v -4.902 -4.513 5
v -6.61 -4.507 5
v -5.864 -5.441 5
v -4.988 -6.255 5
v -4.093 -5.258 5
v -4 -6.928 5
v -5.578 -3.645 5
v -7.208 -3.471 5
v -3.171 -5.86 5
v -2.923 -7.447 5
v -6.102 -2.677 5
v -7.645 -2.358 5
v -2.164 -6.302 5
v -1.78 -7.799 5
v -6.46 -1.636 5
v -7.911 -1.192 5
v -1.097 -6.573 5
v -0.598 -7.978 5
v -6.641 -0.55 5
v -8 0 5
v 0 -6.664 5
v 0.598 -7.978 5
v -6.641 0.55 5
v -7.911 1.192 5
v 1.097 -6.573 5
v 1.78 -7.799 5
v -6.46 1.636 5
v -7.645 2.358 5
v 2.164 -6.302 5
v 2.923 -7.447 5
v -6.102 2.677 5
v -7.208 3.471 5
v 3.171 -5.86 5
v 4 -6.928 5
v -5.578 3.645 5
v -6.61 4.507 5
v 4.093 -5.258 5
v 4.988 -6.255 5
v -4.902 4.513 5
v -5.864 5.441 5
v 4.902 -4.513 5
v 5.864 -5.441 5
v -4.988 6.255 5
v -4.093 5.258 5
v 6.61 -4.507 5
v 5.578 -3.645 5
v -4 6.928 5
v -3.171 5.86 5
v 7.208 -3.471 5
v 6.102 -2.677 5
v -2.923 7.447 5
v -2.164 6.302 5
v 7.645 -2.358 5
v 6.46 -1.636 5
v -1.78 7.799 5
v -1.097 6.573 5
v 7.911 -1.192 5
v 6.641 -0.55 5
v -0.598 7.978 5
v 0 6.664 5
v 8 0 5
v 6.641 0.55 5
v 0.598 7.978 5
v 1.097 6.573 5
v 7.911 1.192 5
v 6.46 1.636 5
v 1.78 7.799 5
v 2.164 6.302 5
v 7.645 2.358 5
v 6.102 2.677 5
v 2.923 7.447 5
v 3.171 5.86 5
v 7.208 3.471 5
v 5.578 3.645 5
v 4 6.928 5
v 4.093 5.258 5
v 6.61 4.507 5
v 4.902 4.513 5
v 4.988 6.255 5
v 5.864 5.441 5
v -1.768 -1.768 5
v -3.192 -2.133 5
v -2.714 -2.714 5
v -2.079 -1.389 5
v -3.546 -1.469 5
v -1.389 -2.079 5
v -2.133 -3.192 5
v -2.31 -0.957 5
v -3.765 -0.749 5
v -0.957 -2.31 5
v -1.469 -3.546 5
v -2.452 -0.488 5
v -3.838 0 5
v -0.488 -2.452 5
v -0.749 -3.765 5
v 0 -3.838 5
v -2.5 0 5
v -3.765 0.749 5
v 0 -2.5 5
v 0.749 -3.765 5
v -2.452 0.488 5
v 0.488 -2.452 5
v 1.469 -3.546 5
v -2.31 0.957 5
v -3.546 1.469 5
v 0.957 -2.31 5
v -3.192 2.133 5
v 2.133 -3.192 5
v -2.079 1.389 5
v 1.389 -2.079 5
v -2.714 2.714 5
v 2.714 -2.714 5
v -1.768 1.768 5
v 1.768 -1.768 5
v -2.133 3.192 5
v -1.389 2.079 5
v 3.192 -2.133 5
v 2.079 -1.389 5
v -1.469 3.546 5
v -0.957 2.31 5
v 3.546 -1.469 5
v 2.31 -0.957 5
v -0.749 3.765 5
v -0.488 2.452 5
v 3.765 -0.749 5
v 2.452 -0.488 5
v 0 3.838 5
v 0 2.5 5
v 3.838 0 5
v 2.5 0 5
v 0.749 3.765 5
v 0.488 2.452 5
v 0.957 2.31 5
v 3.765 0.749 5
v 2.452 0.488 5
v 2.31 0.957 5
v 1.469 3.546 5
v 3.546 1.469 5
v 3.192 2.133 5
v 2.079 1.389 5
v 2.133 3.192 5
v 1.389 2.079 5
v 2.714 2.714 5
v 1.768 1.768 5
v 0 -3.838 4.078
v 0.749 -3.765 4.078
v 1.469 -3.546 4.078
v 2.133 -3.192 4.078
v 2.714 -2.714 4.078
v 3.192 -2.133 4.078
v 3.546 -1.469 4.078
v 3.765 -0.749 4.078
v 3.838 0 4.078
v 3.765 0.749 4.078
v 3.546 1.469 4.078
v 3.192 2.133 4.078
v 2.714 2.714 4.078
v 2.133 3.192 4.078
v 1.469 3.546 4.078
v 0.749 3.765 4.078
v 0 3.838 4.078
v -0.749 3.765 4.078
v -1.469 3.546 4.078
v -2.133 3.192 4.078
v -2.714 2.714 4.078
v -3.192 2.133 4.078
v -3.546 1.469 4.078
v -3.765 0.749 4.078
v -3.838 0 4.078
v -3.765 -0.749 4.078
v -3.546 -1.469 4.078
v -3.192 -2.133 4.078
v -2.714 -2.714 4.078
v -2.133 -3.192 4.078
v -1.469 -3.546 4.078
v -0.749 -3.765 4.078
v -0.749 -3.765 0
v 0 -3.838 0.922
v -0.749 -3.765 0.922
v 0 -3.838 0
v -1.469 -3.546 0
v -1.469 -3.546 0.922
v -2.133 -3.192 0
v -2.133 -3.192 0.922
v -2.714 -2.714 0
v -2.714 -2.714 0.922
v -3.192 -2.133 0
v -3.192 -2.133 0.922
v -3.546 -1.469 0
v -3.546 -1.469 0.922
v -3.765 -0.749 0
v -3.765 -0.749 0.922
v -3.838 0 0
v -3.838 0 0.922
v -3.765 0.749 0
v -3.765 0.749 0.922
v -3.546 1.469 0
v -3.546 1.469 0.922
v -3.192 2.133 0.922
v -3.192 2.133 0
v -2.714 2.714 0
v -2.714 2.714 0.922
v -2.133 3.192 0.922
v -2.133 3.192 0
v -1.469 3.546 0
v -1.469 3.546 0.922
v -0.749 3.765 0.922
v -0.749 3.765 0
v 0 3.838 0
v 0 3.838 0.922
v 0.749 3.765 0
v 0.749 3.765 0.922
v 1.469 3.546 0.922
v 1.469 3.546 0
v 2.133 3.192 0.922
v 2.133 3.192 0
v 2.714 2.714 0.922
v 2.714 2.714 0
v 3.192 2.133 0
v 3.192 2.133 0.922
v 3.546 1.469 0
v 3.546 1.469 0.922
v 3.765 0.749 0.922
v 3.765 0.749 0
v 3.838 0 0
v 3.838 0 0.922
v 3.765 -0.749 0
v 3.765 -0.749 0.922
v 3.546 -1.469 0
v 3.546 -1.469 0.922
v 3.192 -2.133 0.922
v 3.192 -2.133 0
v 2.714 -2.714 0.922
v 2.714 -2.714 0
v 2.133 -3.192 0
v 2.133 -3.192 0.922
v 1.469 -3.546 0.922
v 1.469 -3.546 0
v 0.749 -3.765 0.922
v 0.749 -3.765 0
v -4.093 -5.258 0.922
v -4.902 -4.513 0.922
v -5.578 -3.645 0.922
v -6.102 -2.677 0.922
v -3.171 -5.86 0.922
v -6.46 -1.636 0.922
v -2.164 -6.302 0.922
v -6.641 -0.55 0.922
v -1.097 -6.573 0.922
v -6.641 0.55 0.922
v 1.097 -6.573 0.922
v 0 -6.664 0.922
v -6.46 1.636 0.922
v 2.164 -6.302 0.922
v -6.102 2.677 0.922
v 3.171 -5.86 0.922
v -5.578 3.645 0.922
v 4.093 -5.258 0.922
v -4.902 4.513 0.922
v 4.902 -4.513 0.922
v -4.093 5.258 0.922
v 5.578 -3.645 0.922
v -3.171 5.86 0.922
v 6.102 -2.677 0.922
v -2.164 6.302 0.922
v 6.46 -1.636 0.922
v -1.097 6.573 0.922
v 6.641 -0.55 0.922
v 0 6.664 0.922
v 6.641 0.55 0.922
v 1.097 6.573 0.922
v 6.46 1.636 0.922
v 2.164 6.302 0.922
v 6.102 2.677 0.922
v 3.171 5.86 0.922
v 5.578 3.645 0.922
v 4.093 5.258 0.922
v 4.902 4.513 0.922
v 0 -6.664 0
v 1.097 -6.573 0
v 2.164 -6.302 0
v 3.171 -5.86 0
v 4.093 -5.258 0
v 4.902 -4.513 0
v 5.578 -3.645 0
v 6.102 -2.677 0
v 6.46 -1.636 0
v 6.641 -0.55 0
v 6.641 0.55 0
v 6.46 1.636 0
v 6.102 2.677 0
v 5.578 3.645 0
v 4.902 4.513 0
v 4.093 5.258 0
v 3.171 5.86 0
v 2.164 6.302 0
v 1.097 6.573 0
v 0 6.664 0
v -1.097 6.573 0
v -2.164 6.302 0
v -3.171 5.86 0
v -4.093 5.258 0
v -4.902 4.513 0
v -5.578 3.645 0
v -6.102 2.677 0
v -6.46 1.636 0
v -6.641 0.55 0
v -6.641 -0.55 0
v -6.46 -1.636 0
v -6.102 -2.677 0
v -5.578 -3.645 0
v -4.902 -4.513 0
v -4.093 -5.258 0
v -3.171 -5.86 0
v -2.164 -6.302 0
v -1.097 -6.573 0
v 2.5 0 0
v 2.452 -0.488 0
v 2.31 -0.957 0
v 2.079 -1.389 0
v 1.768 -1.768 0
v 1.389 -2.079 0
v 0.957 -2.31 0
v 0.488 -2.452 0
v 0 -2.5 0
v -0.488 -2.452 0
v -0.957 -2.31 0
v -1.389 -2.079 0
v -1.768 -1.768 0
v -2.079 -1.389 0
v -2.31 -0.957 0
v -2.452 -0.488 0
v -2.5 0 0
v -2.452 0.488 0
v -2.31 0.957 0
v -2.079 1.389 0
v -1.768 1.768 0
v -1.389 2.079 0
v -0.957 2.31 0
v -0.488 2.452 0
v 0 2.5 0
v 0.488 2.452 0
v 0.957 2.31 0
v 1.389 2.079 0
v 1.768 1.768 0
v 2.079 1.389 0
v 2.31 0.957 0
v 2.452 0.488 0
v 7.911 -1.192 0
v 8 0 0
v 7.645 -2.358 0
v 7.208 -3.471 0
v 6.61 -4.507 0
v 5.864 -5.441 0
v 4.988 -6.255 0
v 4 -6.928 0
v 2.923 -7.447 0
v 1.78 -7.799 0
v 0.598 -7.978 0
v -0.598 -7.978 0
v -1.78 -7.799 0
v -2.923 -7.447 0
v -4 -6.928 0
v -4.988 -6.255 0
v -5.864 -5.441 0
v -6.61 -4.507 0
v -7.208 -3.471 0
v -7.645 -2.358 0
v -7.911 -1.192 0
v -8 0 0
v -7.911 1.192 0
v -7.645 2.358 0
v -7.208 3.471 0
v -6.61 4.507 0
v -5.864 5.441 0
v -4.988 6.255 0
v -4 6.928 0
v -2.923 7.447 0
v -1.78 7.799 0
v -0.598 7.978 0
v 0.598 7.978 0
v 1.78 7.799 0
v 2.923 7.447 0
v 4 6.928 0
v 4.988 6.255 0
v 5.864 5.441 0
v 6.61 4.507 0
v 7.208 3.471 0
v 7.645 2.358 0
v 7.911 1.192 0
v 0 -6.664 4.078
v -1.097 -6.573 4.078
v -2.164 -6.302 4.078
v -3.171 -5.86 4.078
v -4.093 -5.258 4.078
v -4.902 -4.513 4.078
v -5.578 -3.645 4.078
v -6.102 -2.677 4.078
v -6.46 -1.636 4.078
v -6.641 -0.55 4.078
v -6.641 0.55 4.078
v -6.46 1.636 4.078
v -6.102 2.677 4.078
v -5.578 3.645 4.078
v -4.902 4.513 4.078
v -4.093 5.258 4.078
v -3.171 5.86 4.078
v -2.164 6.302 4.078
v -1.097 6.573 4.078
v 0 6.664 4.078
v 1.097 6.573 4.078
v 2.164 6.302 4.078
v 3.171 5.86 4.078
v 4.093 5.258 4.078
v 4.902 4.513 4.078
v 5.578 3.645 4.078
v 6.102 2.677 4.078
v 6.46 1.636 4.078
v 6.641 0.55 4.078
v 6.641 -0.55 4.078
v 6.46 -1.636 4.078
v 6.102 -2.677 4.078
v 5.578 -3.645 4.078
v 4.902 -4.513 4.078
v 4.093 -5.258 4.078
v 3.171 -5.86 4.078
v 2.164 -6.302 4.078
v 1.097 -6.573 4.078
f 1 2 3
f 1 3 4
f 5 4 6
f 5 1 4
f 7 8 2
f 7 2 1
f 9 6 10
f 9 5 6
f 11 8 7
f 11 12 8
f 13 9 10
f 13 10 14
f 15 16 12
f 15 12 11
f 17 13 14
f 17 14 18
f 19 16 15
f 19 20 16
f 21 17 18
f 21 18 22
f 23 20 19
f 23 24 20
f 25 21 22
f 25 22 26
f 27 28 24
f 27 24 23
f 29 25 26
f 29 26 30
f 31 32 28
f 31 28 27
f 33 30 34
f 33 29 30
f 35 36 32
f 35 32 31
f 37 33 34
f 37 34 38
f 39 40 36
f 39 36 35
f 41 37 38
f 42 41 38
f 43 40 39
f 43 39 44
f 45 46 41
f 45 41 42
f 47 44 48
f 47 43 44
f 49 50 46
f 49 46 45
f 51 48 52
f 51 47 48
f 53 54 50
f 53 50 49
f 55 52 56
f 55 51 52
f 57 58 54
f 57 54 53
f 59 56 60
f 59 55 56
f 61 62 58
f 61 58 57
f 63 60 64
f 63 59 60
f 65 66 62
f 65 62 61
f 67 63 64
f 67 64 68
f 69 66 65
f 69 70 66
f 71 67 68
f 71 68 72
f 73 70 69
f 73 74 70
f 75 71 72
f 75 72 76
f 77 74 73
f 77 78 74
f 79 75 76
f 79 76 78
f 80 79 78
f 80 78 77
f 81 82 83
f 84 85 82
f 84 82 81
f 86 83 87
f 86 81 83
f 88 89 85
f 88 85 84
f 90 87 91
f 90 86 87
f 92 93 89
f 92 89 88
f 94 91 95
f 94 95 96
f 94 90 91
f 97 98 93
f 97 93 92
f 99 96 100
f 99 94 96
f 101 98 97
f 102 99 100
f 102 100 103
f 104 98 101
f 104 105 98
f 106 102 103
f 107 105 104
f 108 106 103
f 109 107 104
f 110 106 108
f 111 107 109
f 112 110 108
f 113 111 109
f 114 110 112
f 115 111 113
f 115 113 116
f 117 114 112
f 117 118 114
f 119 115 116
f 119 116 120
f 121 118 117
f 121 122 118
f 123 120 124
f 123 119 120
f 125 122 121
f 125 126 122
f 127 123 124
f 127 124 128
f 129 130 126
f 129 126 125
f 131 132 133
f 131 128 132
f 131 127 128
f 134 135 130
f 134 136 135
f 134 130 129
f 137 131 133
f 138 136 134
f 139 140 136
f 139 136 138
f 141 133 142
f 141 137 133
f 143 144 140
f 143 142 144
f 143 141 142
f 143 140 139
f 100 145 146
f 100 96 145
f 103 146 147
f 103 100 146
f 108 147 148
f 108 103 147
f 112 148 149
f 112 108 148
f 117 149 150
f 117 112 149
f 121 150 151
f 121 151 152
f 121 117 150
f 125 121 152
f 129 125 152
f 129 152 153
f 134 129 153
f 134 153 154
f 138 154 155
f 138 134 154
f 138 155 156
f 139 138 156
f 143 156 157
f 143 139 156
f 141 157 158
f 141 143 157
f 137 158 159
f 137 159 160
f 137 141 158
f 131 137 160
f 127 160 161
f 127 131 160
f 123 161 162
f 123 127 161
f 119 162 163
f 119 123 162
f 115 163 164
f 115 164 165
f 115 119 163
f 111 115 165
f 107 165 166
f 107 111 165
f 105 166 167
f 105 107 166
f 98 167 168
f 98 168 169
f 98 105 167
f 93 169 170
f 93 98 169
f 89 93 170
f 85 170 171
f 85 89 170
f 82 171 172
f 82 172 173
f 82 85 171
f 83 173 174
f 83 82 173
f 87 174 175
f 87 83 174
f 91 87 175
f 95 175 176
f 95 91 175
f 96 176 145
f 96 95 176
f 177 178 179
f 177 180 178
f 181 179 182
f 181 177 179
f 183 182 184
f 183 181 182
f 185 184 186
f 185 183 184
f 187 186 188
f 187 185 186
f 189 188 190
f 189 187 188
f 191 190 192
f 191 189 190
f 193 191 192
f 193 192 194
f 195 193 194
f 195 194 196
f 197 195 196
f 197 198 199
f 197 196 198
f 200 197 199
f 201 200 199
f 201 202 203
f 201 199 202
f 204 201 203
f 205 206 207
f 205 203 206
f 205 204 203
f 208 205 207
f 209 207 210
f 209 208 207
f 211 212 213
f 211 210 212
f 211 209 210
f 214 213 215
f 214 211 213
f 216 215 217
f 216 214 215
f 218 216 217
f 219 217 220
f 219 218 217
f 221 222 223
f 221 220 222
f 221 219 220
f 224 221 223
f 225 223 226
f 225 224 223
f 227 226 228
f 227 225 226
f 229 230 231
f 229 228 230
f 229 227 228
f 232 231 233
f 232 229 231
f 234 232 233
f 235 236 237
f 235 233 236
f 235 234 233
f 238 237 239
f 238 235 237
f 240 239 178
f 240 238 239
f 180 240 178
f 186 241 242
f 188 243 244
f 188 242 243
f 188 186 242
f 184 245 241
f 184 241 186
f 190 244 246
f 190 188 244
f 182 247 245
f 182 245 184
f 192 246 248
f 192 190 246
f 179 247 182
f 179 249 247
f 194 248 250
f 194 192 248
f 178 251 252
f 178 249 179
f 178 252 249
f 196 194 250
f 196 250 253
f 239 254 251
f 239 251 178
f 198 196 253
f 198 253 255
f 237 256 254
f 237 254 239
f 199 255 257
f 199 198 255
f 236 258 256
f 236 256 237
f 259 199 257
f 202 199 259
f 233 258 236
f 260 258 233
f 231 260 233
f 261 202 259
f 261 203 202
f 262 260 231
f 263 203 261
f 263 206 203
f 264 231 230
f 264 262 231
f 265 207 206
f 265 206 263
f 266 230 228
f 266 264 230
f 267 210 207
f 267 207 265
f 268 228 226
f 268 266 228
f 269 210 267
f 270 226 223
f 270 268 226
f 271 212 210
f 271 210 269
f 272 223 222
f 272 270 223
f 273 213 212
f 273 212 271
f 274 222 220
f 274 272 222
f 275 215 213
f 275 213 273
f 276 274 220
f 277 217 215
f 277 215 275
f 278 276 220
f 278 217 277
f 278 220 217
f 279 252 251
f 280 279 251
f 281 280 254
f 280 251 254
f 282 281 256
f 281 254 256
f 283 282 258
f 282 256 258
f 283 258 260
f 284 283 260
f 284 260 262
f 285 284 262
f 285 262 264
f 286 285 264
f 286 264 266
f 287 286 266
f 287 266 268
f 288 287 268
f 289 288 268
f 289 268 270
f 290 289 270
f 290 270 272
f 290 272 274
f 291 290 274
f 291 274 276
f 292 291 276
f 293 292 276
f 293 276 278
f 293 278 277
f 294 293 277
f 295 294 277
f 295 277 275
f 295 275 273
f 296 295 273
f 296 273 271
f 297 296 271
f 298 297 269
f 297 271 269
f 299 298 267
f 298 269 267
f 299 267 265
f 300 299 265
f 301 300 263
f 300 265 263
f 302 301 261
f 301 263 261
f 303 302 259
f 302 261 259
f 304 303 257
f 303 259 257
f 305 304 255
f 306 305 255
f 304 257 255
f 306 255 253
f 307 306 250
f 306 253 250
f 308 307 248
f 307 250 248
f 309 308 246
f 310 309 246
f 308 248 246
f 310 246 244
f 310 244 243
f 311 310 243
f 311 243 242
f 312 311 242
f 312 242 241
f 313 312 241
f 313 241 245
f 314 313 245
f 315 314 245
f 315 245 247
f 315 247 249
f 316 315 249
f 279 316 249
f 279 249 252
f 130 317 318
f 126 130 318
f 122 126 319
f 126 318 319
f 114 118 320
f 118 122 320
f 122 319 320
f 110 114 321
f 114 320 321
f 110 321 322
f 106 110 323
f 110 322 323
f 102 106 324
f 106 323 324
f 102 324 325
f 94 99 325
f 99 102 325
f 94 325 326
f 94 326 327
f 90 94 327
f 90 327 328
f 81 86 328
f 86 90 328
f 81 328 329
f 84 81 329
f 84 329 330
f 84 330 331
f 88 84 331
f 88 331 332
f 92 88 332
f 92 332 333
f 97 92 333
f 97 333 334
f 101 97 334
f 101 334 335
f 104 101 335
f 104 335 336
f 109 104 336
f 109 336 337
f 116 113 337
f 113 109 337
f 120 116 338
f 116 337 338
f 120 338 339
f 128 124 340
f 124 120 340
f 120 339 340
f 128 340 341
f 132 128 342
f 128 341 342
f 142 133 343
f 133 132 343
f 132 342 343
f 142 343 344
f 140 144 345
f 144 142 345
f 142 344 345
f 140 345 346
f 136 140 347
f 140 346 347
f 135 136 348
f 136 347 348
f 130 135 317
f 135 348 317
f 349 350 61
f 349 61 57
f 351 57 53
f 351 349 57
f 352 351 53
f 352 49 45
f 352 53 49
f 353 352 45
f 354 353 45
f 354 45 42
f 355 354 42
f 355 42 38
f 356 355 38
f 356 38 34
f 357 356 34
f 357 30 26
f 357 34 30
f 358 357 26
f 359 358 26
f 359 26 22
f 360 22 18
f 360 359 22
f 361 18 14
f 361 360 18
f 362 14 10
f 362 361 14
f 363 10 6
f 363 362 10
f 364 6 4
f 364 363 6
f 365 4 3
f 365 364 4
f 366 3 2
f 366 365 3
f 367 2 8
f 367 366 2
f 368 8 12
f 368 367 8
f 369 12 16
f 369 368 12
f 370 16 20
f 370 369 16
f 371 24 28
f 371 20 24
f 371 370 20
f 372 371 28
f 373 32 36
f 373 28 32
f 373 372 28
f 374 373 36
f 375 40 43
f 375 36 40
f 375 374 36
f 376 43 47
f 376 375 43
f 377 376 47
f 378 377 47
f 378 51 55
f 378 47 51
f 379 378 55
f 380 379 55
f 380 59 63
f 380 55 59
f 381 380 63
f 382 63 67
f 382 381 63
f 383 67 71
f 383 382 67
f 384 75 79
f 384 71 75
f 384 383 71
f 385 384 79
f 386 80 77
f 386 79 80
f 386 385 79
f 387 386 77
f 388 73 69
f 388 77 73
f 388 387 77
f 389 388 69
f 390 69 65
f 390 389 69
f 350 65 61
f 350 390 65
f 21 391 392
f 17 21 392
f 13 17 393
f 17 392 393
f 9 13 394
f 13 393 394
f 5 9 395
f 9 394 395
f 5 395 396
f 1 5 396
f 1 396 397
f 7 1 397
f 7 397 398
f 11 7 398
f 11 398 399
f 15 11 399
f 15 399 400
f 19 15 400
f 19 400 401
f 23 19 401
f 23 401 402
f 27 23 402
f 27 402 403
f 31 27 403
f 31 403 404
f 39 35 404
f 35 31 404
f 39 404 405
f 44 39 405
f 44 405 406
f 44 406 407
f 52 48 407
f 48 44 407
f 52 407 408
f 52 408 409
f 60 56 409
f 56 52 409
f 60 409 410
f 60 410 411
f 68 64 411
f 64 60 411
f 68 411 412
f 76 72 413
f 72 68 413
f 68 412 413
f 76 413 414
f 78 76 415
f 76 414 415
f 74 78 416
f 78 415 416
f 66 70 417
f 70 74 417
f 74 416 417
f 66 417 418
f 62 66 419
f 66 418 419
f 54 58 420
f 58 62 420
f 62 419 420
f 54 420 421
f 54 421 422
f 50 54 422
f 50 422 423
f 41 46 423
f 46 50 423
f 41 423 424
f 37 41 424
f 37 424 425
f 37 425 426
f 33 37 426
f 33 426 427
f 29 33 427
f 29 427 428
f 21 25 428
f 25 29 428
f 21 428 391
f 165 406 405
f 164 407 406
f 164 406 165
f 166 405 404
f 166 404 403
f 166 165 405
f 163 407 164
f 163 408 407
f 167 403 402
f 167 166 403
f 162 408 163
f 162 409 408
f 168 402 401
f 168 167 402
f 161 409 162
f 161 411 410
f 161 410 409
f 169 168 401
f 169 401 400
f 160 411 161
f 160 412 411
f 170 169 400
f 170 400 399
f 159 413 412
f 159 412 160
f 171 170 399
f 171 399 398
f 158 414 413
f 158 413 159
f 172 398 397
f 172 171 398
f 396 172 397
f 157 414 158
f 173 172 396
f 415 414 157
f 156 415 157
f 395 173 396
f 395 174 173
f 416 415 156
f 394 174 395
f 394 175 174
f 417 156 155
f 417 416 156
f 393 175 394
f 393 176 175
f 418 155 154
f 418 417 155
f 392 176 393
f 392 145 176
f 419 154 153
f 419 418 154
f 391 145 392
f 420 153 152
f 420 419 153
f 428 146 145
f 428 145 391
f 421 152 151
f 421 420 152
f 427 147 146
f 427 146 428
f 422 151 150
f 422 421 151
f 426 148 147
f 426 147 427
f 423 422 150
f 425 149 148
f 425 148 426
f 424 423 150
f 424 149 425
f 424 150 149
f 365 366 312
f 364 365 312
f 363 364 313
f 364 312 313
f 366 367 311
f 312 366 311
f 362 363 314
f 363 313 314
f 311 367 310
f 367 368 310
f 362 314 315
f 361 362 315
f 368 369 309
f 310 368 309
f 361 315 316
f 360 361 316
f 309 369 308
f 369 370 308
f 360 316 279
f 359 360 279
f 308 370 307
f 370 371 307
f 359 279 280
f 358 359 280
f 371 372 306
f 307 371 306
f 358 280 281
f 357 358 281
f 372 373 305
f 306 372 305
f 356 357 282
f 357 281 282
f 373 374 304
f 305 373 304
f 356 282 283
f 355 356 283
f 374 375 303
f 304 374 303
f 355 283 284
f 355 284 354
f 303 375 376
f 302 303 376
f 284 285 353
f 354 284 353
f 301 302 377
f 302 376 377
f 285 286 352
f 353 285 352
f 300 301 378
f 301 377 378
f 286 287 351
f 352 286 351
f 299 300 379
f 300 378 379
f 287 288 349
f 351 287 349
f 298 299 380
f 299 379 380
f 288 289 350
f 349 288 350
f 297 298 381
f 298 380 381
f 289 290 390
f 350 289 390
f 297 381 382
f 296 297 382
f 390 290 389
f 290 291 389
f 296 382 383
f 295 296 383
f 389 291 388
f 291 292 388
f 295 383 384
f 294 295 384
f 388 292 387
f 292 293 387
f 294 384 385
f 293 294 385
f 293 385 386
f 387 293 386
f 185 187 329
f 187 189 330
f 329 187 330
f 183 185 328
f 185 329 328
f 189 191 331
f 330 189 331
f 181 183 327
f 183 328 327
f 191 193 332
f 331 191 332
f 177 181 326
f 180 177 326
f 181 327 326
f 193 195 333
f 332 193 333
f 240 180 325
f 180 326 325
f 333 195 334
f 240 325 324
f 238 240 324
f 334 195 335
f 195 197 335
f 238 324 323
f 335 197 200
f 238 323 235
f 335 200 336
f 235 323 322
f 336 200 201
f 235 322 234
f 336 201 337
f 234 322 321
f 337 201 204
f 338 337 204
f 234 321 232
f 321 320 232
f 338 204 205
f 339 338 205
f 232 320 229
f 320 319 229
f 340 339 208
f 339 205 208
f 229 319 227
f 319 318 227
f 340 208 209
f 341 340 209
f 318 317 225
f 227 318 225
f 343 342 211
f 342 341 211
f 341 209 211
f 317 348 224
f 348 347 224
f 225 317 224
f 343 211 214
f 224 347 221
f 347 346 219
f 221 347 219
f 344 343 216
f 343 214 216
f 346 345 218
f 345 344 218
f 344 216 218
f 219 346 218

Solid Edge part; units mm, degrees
sketch "Sketch1" plane through (0, 0, 0) normal (0, 0, 1) x (1, 0, 0)
  circle A0 centre (0, 0) radius 8
  circle A1 centre (0, 0) radius 2.5
  dimension "D1" = 16
  dimension "D2" = 5
extrude "Protrusion1" add sketch "Sketch1" along normal blind 5
sketch "Sketch2" plane through (0, 0, 0) normal (1, 0, 0) x (0, 1, 0)
  line L0 (-6.6635, 5) -> (-6.6635, 4.0783)
  line L1 (-6.6635, 4.0783) -> (-3.8384, 4.0783)
  line L2 (-3.8384, 4.0783) -> (-3.8384, 5)
revolve "RevolvedCutout1" cut sketch "Sketch2" angle 360 about axis through (0, 0, -57) along (0, 0, 1) material side at (0, -6.6135, 4.5391)
mirror "Mirror1" about plane through (0, 0, 2.5) normal (0, 0, 1) of "RevolvedCutout1"
properties material "Stainless steel"
